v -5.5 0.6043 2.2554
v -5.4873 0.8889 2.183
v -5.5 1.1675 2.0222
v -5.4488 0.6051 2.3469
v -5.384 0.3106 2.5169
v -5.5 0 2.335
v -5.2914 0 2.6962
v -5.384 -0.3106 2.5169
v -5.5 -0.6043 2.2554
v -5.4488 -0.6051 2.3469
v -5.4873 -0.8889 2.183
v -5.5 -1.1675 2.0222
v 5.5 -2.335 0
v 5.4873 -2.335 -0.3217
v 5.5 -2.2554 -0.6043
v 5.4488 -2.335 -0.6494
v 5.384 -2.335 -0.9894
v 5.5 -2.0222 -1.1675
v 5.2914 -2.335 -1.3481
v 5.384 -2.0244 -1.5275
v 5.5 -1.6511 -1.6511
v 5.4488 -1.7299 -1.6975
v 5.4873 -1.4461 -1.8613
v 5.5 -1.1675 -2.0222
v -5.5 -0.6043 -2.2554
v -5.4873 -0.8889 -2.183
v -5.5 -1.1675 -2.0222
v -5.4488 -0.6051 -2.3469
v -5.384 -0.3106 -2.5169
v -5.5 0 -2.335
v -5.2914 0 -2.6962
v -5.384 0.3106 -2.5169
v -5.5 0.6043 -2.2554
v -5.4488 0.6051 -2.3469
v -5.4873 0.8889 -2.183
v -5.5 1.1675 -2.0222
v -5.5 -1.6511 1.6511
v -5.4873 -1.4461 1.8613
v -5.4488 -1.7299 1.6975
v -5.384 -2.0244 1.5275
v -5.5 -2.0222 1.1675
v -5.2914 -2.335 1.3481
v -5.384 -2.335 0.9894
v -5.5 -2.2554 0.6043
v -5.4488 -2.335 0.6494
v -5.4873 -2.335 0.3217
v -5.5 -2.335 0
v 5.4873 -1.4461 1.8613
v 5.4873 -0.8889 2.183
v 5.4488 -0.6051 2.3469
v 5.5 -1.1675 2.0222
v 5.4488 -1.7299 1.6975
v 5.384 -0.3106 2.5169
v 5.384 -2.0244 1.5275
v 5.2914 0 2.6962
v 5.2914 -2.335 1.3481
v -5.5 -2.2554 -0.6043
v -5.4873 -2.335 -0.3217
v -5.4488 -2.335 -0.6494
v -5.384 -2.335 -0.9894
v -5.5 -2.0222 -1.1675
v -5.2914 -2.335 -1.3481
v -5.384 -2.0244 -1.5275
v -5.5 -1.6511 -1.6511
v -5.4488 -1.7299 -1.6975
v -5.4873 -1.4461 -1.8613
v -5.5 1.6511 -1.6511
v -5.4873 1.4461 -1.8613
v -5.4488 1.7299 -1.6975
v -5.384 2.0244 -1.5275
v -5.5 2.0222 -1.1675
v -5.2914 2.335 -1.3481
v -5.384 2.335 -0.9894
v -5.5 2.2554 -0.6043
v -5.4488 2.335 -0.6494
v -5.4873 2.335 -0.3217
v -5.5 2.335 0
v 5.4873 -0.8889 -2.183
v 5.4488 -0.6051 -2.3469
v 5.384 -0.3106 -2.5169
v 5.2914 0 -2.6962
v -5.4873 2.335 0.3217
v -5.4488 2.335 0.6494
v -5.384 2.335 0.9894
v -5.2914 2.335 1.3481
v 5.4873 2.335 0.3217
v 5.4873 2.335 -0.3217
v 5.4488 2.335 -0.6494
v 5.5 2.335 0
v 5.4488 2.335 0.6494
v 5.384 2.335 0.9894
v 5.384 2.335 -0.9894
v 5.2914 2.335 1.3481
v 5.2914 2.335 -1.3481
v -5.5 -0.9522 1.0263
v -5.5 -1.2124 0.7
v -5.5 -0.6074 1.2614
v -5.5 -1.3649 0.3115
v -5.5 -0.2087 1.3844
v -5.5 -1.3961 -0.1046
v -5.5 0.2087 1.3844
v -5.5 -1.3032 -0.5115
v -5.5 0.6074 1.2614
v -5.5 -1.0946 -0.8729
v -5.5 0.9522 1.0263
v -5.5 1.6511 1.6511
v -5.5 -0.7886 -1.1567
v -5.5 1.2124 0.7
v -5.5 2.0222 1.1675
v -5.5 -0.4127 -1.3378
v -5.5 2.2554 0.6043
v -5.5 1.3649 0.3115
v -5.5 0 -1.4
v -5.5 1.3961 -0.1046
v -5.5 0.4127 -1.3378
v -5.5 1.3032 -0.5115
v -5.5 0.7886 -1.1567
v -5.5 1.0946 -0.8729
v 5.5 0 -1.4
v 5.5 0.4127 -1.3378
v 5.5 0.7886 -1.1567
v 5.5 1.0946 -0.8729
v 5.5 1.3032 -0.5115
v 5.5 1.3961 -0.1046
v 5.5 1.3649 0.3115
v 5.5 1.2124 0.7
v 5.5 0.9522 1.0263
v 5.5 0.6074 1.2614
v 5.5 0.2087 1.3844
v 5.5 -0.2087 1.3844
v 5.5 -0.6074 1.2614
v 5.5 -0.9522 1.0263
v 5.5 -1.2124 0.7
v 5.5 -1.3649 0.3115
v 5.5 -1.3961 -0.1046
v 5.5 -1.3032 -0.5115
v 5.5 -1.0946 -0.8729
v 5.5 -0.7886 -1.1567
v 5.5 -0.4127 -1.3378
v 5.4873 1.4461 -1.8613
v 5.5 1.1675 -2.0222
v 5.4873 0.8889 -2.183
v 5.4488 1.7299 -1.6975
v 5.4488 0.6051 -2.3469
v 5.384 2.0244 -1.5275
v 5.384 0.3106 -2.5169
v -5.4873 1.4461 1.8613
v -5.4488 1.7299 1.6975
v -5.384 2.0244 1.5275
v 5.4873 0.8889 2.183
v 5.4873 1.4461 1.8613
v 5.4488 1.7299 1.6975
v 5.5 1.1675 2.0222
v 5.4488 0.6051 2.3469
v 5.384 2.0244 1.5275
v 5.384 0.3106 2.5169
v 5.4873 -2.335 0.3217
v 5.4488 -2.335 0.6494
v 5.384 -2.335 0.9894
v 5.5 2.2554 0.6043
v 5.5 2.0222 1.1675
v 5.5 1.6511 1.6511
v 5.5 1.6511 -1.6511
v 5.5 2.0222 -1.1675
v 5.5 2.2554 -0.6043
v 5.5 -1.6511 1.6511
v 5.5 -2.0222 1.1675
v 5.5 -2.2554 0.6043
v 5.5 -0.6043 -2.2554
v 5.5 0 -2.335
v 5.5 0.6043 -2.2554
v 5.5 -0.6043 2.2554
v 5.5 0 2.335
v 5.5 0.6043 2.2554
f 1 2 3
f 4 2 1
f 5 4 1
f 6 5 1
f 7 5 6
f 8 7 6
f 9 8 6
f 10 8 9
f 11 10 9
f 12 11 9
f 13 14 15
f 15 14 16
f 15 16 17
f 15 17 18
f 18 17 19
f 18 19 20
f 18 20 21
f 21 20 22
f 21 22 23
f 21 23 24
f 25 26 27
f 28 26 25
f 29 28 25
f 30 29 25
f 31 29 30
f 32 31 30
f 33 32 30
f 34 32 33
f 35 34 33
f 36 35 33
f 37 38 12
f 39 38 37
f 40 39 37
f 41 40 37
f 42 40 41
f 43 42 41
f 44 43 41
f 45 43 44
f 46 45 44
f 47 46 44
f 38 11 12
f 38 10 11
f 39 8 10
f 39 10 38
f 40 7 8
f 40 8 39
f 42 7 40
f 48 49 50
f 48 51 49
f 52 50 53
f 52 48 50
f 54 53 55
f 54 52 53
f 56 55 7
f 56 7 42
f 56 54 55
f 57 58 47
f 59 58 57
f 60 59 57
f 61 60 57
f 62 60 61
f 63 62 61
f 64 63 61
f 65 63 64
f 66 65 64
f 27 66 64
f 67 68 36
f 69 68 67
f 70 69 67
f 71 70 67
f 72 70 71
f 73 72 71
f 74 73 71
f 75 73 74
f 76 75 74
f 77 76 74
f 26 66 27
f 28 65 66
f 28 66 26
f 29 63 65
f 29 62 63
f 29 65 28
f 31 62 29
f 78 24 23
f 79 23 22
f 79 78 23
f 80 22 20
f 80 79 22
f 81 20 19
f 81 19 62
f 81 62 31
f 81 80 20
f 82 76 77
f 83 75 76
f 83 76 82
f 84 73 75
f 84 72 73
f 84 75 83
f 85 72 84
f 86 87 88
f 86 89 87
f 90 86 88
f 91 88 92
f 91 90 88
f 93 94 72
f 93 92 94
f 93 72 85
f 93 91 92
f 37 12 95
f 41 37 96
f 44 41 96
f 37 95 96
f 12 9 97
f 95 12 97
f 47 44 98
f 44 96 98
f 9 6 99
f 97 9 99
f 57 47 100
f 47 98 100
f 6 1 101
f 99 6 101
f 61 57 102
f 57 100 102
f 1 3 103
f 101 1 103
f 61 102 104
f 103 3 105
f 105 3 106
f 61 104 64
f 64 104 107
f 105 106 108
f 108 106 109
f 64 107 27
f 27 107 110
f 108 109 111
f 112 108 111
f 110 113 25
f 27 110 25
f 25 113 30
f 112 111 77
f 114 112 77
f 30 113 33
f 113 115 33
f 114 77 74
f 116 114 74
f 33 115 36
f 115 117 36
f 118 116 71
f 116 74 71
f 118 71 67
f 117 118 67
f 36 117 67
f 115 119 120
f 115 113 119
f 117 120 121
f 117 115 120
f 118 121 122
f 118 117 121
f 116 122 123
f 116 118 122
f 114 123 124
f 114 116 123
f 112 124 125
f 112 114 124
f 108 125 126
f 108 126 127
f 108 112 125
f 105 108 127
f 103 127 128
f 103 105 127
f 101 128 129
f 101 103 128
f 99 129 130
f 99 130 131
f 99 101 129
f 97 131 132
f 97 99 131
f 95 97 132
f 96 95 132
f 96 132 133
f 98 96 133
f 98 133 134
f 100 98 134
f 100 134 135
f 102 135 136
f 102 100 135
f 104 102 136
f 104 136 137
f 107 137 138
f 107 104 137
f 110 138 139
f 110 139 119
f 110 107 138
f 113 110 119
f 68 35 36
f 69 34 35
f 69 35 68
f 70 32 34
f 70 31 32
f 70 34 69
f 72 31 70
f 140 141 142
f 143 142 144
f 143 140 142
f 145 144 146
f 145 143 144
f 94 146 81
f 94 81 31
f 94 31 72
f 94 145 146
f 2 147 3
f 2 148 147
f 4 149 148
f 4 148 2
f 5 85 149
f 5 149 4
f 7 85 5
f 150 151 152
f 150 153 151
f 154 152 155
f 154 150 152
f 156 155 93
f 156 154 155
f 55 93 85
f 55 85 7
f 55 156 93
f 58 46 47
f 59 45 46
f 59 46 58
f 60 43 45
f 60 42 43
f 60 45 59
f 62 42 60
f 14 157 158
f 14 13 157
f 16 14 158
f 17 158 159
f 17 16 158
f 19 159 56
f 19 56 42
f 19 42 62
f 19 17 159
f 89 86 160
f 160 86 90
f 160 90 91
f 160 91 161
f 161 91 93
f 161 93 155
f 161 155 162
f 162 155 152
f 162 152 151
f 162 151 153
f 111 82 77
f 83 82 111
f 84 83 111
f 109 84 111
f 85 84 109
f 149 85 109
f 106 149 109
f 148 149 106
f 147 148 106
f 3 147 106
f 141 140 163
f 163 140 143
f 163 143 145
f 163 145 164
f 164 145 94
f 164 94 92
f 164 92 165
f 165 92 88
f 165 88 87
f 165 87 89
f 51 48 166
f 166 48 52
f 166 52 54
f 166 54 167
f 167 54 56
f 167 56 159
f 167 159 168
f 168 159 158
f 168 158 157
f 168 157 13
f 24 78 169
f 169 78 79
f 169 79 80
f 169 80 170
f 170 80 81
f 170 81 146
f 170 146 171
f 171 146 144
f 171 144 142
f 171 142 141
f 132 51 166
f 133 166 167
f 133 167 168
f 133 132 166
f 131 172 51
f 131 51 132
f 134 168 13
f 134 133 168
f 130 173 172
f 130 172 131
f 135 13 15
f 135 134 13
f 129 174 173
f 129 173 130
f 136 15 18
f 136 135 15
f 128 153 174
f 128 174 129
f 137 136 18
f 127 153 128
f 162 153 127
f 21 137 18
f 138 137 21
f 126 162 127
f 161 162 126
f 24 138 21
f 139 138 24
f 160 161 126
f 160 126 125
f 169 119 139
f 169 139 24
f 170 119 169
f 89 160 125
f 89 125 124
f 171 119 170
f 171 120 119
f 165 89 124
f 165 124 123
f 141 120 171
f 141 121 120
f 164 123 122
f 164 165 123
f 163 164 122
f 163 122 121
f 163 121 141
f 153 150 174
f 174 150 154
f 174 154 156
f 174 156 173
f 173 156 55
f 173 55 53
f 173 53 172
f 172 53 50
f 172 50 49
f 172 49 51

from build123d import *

# Parameters (mm, degrees)
SKETCH1_R      = 1.4
EXTRUDE1_DEPTH = 5.5


# Read off the part's stored shape, not the designer's step: Cut-Extrude1
with BuildPart() as part:
    # Sketch1 → Extrude1 (new, symmetric)
    with BuildSketch(Plane(origin=(0, 0, 0), x_dir=(0, 0, -1), z_dir=(1, 0, 0))):
        Polygon((2.696225757, 0), (1.348112879, 2.335), (-1.348112879, 2.335), (-2.696225757, 0), (-1.348112879, -2.335), (1.348112879, -2.335), align=None)
        Circle(SKETCH1_R, mode=Mode.SUBTRACT)
    extrude(amount=EXTRUDE1_DEPTH, both=True)

    # Cut-Extrude1 outline → Cut-Extrude1 (revolve, cut)
    with BuildSketch(Plane.YX):
        Polygon((2.696225758, 5.5), (2.335, 5.5), (2.696225751, 5.291446215), align=None)
    cut_extrude1 = revolve(axis=Axis((0, 0, 0), (1, 0, 0)), mode=Mode.SUBTRACT)

    # Mirror1: Cut-Extrude1 across plane
    add(cut_extrude1.mirror(Plane(origin=(0, 0, 0), x_dir=(0, 0, 1), z_dir=(1, 0, 0))), mode=Mode.SUBTRACT)


solid = part.part
